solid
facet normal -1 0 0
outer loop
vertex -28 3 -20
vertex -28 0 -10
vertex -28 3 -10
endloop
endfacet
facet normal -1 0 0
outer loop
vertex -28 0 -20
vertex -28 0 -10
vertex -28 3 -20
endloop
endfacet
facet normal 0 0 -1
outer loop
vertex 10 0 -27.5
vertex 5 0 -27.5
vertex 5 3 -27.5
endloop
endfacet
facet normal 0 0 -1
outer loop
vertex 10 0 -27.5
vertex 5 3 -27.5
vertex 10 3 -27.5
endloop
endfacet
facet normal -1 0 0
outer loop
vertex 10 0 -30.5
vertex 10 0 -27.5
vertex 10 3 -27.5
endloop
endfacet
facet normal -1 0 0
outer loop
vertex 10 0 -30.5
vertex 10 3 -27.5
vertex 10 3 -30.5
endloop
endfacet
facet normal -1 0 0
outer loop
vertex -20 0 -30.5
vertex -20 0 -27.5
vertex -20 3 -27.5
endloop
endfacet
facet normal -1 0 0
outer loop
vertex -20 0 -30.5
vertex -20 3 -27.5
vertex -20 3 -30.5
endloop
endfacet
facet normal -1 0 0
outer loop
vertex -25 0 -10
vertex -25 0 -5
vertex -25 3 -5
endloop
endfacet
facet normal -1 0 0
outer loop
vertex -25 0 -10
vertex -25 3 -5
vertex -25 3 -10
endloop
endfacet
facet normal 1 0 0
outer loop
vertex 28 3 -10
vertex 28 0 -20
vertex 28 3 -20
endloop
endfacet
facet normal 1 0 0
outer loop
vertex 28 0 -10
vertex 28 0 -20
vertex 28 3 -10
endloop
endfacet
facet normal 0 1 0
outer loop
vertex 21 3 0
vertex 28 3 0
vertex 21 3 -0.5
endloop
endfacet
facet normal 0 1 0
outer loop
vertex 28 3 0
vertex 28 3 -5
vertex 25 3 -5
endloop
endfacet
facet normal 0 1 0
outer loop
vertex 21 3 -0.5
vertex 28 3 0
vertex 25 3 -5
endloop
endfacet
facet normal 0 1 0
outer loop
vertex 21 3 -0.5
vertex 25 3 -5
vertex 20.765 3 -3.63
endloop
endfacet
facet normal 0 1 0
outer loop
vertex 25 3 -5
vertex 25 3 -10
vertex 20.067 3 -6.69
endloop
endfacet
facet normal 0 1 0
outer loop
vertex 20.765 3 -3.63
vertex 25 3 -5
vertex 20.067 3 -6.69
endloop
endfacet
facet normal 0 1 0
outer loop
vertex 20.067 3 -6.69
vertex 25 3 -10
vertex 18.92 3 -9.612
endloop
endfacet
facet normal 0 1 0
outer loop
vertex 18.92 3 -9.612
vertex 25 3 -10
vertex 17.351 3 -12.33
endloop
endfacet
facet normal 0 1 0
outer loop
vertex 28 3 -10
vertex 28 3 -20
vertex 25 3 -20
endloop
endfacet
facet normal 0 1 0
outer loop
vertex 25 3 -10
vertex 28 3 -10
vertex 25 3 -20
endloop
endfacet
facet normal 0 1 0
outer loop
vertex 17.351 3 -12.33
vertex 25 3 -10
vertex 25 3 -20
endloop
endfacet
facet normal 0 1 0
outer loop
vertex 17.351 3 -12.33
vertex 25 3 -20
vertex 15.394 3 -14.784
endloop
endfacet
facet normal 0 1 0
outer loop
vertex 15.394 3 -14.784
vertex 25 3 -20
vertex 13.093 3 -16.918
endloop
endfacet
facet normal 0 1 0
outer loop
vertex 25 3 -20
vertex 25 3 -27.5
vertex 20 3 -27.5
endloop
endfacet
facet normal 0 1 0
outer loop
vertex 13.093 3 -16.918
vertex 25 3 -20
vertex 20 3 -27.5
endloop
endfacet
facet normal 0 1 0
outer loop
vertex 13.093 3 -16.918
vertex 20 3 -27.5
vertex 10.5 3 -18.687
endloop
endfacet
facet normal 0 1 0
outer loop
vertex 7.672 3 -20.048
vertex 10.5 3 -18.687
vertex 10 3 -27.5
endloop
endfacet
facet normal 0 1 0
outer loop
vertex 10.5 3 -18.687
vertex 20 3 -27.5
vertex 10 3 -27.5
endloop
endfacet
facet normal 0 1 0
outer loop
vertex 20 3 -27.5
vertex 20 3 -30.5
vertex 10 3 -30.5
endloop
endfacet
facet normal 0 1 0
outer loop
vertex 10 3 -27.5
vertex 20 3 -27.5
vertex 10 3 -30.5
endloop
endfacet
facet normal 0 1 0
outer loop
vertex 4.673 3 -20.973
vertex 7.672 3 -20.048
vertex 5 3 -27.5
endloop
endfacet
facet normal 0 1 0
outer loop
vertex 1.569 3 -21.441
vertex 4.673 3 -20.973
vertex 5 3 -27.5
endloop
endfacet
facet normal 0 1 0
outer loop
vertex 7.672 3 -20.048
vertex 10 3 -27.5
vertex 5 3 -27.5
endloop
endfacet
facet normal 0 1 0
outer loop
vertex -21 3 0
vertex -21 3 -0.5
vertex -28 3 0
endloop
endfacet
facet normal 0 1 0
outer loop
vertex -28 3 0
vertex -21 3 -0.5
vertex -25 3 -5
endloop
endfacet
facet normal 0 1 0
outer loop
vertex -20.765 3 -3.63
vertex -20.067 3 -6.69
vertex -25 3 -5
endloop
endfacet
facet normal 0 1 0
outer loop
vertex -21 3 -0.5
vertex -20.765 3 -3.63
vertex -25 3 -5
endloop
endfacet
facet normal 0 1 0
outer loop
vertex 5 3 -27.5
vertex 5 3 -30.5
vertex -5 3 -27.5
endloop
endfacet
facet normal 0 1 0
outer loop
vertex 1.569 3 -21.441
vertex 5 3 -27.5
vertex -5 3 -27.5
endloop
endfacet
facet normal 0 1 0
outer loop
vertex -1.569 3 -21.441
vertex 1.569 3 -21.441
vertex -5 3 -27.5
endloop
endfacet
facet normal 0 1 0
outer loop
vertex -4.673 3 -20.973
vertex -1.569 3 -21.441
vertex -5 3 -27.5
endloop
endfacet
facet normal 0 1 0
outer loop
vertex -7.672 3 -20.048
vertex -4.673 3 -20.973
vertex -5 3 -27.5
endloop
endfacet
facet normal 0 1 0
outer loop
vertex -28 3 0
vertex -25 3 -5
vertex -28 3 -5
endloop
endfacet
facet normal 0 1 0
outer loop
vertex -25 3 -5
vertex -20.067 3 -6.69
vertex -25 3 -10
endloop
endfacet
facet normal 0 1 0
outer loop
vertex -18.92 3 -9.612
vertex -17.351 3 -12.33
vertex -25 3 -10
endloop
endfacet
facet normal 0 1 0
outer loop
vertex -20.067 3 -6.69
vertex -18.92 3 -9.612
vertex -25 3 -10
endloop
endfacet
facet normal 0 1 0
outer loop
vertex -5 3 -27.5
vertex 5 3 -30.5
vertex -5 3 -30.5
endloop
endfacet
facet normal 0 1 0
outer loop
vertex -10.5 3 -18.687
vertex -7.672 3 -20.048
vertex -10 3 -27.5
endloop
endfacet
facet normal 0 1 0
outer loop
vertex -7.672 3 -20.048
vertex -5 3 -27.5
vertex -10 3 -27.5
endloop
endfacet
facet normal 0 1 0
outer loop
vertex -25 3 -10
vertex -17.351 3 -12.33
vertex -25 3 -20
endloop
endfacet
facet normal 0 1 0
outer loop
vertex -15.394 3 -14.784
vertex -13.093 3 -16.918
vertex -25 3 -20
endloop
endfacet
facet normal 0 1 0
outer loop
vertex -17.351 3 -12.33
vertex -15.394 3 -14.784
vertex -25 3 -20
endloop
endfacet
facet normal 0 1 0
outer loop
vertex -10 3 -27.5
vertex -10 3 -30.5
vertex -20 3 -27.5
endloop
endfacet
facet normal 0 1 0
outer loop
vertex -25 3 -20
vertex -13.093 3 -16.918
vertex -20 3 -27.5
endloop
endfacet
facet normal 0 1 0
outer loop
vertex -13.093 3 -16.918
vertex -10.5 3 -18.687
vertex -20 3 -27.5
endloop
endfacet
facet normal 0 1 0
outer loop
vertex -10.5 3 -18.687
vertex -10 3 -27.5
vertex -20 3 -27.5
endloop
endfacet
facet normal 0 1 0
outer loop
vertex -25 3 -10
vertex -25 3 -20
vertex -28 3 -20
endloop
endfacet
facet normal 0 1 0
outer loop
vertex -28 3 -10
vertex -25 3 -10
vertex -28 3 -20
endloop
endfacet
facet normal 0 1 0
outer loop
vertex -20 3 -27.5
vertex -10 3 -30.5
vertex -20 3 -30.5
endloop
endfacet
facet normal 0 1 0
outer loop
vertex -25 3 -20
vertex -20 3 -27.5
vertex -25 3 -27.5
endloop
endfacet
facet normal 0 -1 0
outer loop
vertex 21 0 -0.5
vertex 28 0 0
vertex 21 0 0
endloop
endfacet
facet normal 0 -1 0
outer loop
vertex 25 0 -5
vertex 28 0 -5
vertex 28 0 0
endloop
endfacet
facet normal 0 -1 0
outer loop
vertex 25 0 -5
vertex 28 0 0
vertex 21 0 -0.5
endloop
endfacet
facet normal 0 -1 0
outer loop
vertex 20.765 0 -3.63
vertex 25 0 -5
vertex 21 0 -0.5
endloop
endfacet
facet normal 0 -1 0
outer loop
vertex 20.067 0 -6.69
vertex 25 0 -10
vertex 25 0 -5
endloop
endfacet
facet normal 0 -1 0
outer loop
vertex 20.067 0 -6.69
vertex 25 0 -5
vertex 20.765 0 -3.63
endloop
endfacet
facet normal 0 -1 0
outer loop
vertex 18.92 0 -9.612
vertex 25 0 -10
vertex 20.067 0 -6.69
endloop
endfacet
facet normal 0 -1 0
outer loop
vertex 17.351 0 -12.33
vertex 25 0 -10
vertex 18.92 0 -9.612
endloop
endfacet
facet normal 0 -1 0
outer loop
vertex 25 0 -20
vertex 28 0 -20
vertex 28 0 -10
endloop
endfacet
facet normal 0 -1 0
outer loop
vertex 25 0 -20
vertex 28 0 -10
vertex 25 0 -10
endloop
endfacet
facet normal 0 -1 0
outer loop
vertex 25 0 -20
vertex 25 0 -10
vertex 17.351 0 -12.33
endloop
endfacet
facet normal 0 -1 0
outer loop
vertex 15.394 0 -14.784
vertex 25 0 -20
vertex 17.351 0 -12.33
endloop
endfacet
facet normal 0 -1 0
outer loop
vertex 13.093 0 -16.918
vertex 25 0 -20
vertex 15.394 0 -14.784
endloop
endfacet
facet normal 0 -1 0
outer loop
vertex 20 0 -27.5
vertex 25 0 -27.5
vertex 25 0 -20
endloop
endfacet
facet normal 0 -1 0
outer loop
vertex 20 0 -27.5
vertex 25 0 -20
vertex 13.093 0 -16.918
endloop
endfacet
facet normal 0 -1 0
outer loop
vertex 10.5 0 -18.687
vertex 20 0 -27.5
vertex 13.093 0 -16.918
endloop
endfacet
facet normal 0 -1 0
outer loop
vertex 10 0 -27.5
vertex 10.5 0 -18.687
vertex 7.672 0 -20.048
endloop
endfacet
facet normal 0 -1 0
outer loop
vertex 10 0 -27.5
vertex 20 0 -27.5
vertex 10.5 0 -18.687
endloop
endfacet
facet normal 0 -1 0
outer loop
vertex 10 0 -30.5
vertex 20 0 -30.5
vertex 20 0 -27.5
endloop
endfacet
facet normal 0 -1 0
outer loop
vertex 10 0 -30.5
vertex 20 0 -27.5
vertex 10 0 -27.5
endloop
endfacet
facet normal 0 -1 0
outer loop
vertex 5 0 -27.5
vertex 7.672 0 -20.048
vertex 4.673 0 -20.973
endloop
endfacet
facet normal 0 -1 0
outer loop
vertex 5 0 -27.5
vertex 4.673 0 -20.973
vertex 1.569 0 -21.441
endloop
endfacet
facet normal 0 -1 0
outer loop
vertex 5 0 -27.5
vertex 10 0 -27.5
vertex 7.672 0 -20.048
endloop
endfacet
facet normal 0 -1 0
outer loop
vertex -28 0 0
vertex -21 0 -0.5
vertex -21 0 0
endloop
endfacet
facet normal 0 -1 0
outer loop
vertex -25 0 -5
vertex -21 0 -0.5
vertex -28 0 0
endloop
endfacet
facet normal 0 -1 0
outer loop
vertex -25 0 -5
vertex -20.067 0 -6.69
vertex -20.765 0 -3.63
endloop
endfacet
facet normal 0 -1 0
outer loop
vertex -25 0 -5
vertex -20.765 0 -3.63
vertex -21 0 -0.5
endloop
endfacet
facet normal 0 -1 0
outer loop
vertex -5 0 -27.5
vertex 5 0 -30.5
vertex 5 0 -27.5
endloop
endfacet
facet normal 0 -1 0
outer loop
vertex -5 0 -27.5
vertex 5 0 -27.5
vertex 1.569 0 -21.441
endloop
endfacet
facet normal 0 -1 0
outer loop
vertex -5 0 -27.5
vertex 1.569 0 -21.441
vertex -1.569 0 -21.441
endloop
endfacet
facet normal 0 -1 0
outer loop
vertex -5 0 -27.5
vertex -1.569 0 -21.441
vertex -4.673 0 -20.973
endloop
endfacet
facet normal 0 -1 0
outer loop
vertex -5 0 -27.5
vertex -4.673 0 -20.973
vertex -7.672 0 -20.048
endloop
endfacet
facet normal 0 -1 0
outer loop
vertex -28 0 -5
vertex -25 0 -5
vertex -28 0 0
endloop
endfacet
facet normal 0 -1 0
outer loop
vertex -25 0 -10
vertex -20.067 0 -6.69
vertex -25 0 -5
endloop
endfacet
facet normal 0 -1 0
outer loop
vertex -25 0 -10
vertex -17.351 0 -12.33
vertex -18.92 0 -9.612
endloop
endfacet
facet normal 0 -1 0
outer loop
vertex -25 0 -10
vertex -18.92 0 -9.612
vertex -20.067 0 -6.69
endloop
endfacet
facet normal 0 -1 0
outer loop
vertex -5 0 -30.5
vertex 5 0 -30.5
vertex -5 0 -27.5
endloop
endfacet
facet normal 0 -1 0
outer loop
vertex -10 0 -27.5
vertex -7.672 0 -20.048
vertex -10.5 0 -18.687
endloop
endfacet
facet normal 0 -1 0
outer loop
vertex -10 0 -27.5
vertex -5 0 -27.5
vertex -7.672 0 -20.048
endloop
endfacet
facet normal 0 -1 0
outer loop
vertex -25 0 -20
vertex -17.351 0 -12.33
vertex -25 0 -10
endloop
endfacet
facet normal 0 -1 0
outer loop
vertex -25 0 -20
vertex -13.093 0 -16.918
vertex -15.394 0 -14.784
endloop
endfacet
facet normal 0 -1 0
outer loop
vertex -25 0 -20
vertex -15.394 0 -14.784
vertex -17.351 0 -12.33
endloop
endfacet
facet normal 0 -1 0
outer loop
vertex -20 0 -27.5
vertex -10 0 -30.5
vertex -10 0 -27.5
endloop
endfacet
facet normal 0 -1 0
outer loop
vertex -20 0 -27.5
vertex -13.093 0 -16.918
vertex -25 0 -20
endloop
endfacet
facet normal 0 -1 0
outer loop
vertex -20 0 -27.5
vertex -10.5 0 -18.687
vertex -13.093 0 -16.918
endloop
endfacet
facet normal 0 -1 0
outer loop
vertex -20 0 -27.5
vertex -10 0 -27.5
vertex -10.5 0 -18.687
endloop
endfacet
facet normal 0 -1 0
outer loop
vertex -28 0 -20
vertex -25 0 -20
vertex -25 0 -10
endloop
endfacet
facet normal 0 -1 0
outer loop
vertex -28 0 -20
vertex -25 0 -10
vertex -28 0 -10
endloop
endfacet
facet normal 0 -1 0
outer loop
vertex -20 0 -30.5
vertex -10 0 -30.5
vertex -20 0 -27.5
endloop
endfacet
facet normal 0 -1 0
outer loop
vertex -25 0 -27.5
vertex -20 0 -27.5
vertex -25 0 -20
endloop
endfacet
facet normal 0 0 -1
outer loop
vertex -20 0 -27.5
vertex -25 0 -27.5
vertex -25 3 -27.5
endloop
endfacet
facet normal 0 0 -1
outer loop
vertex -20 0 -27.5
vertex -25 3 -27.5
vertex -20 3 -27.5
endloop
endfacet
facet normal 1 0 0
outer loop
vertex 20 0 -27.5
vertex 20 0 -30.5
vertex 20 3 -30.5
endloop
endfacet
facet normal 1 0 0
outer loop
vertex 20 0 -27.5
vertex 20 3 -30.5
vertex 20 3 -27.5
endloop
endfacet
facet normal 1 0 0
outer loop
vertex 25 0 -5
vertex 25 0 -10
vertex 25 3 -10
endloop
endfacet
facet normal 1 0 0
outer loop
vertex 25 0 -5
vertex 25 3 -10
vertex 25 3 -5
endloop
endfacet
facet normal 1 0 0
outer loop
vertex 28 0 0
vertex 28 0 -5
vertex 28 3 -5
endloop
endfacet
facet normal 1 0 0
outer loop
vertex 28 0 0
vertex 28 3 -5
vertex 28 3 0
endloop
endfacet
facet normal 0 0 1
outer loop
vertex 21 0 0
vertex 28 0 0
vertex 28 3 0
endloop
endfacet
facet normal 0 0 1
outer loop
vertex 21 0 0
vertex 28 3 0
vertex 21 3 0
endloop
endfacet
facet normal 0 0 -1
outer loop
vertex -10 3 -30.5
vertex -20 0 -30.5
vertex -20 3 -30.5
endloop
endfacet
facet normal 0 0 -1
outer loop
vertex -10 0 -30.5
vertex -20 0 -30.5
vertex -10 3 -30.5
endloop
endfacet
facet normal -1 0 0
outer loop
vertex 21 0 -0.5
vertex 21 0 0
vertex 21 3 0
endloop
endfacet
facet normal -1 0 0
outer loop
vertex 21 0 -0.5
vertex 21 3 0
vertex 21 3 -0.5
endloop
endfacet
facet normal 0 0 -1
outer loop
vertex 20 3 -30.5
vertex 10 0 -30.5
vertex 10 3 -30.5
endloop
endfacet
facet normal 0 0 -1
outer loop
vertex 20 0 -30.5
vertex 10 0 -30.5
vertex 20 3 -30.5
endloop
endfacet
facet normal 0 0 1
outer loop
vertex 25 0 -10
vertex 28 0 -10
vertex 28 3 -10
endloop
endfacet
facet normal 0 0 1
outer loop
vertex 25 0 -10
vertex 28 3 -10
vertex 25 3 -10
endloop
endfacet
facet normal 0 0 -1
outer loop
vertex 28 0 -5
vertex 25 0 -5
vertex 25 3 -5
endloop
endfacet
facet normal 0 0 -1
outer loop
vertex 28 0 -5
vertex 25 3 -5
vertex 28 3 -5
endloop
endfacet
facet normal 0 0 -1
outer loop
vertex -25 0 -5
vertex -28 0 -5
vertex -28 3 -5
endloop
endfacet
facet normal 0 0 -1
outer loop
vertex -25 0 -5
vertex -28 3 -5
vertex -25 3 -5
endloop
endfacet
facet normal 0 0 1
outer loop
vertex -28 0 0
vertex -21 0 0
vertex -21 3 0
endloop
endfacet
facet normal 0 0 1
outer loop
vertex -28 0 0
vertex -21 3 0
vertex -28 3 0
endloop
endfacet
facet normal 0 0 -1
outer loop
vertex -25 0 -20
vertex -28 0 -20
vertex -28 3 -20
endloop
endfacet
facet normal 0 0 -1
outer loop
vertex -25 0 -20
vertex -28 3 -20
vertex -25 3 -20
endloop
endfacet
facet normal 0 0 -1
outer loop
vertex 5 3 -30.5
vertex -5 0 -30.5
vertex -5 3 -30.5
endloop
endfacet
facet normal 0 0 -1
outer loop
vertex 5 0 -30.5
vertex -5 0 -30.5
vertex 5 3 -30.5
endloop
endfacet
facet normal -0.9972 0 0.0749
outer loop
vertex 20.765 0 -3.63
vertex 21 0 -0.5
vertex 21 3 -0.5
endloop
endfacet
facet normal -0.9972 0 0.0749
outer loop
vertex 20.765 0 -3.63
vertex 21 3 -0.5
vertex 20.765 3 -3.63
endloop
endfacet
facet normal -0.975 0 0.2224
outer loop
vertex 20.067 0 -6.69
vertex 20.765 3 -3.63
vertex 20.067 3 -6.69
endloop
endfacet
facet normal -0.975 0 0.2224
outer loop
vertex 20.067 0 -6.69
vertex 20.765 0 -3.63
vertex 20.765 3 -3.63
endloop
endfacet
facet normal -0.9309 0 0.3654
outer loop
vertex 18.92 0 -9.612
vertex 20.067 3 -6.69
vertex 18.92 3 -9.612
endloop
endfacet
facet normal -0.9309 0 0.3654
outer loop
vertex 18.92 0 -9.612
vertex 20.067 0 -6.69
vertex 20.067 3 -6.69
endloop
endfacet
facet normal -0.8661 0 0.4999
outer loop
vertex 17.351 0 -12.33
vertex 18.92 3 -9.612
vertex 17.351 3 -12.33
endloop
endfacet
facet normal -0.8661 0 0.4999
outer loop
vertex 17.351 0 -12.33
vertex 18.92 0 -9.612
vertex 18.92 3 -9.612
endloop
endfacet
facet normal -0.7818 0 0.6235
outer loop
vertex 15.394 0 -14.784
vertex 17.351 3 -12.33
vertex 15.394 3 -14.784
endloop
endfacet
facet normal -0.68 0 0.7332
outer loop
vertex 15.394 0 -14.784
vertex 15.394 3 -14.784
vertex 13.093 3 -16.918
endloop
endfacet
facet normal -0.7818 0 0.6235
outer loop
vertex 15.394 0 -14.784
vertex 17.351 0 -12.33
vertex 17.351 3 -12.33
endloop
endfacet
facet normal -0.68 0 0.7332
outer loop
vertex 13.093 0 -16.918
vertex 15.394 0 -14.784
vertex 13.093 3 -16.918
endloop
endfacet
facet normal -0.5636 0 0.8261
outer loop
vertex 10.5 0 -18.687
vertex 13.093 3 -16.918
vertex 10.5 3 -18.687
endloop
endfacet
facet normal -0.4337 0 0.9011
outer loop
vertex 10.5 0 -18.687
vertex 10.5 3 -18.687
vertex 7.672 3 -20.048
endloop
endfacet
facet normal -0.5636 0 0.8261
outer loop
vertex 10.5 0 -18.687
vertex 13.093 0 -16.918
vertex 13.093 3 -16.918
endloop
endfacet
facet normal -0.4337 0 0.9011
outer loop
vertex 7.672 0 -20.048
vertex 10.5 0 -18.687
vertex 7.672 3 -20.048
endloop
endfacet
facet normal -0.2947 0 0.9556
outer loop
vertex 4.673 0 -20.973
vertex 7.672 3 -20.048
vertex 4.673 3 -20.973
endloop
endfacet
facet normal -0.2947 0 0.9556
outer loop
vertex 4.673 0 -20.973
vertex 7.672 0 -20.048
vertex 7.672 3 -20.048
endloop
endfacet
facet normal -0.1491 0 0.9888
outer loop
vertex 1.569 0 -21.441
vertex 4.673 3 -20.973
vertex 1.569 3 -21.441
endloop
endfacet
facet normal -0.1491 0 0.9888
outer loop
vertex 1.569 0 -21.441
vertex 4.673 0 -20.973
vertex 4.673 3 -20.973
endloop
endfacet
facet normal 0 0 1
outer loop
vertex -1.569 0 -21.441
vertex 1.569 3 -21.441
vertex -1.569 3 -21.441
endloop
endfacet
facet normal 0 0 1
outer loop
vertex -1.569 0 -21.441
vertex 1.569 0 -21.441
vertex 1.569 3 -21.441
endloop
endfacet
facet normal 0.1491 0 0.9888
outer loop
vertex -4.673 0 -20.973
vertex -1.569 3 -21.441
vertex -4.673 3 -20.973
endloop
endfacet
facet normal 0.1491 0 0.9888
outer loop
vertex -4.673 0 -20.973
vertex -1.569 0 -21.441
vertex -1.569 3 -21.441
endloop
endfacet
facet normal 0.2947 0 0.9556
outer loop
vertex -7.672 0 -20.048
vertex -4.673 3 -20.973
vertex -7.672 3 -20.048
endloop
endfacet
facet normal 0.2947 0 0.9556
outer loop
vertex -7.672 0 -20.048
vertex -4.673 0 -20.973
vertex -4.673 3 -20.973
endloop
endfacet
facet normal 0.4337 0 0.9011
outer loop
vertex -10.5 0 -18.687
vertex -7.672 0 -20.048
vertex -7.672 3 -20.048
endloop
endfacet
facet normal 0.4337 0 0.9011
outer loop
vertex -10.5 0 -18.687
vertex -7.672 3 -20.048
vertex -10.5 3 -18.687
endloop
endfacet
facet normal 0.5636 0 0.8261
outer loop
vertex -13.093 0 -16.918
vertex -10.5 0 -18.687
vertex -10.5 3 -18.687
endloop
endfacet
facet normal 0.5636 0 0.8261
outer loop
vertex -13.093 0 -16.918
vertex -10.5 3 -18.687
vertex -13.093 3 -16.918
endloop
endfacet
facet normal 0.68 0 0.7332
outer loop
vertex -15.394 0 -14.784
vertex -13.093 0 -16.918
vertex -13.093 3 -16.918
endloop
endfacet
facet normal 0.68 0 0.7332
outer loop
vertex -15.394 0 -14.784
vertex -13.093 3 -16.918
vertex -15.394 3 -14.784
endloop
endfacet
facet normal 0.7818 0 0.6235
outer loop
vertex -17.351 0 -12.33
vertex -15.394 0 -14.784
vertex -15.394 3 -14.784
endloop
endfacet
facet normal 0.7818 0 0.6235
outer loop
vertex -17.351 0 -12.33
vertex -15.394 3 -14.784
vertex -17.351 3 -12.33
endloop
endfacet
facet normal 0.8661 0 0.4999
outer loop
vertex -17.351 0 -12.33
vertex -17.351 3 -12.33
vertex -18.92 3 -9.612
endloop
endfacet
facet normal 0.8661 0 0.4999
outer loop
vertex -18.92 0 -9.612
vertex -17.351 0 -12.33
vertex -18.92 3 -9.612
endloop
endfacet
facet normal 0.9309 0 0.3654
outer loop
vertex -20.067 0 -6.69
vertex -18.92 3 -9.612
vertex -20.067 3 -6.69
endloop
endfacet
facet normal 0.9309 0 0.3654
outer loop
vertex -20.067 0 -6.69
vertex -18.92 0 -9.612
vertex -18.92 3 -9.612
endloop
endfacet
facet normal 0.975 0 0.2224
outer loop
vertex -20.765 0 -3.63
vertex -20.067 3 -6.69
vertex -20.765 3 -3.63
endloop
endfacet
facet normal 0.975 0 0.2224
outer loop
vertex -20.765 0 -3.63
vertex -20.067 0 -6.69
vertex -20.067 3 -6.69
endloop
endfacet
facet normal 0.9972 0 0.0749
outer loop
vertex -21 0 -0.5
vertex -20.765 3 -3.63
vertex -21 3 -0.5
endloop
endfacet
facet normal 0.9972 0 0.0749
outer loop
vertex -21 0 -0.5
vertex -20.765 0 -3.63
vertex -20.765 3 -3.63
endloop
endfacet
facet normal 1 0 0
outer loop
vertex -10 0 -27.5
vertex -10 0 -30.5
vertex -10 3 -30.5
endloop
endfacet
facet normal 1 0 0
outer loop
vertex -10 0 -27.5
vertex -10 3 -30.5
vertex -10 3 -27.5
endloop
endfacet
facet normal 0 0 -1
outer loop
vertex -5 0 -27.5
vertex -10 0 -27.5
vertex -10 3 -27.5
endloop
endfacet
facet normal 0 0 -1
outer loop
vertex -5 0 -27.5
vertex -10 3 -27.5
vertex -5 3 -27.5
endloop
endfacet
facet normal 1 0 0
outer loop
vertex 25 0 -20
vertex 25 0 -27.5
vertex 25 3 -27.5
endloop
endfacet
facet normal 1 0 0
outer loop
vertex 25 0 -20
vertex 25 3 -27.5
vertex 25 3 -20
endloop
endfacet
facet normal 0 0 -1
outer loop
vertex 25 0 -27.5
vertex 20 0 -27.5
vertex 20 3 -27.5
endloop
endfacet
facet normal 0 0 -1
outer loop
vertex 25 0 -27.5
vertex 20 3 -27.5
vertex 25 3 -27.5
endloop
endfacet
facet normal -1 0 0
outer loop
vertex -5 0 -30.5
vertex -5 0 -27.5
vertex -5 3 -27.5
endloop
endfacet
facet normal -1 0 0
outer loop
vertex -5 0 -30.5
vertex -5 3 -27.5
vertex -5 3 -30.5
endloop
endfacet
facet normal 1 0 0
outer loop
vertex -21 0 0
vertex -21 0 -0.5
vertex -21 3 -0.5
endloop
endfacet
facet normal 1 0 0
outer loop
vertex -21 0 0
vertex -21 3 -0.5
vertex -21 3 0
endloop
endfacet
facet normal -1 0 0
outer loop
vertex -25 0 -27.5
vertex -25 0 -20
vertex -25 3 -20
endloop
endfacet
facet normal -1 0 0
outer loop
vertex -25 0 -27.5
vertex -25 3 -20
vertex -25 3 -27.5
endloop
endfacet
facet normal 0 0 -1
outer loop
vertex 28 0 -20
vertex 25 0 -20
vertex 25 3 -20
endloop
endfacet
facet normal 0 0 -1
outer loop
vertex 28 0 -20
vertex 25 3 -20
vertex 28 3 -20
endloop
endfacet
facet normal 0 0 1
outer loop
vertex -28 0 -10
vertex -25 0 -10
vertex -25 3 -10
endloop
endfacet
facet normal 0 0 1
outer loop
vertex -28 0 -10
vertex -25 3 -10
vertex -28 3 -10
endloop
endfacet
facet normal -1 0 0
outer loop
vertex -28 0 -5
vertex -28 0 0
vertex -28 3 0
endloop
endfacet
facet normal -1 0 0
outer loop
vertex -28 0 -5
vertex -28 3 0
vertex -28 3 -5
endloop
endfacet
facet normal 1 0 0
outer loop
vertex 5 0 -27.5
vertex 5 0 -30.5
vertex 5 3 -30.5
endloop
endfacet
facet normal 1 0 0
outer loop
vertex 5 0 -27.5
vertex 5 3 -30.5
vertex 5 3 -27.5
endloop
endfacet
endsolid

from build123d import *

# Parameters (mm, degrees)
EXTRUDE_1_DEPTH = 3


with BuildPart() as part:
    # 草图2 → 凸台-拉伸1 (new body)
    with BuildSketch(Plane(origin=(0, 0, 0), x_dir=(1, 0, 0), z_dir=(0, 1, 0))):
        with BuildLine():
            Line((-25, 27.5), (-20, 27.5))
            Line((-20, 27.5), (-20, 30.5))
            Line((-20, 30.5), (-10, 30.5))
            Line((-10, 30.5), (-10, 27.5))
            Line((-10, 27.5), (-5, 27.5))
            Line((-5, 27.5), (-5, 30.5))
            Line((-5, 30.5), (5, 30.5))
            Line((5, 30.5), (5, 27.5))
            Line((5, 27.5), (10, 27.5))
            Line((10, 27.5), (10, 30.5))
            Line((10, 30.5), (20, 30.5))
            Line((20, 30.5), (20, 27.5))
            Line((20, 27.5), (25, 27.5))
            Line((25, 27.5), (25, 20))
            Line((25, 20), (28, 20))
            Line((28, 20), (28, 10))
            Line((28, 10), (25, 10))
            Line((25, 10), (25, 5))
            Line((25, 5), (28, 5))
            Line((28, 5), (28, 0.5))
            Line((28, 0.5), (28, 0))
            Line((28, 0), (21, 0))
            Line((21, 0), (21, 0.5))
            ThreePointArc((21, 0.5), (0, 21.5), (-21, 0.5))
            Line((-21, 0.5), (-21, 0))
            Line((-21, 0), (-28, 0))
            Line((-28, 0), (-28, 0.5))
            Line((-28, 0.5), (-28, 5))
            Line((-28, 5), (-25, 5))
            Line((-25, 5), (-25, 10))
            Line((-25, 10), (-28, 10))
            Line((-28, 10), (-28, 20))
            Line((-28, 20), (-25, 20))
            Line((-25, 20), (-25, 27.5))
        make_face()
    extrude(amount=EXTRUDE_1_DEPTH)


solid = part.part
